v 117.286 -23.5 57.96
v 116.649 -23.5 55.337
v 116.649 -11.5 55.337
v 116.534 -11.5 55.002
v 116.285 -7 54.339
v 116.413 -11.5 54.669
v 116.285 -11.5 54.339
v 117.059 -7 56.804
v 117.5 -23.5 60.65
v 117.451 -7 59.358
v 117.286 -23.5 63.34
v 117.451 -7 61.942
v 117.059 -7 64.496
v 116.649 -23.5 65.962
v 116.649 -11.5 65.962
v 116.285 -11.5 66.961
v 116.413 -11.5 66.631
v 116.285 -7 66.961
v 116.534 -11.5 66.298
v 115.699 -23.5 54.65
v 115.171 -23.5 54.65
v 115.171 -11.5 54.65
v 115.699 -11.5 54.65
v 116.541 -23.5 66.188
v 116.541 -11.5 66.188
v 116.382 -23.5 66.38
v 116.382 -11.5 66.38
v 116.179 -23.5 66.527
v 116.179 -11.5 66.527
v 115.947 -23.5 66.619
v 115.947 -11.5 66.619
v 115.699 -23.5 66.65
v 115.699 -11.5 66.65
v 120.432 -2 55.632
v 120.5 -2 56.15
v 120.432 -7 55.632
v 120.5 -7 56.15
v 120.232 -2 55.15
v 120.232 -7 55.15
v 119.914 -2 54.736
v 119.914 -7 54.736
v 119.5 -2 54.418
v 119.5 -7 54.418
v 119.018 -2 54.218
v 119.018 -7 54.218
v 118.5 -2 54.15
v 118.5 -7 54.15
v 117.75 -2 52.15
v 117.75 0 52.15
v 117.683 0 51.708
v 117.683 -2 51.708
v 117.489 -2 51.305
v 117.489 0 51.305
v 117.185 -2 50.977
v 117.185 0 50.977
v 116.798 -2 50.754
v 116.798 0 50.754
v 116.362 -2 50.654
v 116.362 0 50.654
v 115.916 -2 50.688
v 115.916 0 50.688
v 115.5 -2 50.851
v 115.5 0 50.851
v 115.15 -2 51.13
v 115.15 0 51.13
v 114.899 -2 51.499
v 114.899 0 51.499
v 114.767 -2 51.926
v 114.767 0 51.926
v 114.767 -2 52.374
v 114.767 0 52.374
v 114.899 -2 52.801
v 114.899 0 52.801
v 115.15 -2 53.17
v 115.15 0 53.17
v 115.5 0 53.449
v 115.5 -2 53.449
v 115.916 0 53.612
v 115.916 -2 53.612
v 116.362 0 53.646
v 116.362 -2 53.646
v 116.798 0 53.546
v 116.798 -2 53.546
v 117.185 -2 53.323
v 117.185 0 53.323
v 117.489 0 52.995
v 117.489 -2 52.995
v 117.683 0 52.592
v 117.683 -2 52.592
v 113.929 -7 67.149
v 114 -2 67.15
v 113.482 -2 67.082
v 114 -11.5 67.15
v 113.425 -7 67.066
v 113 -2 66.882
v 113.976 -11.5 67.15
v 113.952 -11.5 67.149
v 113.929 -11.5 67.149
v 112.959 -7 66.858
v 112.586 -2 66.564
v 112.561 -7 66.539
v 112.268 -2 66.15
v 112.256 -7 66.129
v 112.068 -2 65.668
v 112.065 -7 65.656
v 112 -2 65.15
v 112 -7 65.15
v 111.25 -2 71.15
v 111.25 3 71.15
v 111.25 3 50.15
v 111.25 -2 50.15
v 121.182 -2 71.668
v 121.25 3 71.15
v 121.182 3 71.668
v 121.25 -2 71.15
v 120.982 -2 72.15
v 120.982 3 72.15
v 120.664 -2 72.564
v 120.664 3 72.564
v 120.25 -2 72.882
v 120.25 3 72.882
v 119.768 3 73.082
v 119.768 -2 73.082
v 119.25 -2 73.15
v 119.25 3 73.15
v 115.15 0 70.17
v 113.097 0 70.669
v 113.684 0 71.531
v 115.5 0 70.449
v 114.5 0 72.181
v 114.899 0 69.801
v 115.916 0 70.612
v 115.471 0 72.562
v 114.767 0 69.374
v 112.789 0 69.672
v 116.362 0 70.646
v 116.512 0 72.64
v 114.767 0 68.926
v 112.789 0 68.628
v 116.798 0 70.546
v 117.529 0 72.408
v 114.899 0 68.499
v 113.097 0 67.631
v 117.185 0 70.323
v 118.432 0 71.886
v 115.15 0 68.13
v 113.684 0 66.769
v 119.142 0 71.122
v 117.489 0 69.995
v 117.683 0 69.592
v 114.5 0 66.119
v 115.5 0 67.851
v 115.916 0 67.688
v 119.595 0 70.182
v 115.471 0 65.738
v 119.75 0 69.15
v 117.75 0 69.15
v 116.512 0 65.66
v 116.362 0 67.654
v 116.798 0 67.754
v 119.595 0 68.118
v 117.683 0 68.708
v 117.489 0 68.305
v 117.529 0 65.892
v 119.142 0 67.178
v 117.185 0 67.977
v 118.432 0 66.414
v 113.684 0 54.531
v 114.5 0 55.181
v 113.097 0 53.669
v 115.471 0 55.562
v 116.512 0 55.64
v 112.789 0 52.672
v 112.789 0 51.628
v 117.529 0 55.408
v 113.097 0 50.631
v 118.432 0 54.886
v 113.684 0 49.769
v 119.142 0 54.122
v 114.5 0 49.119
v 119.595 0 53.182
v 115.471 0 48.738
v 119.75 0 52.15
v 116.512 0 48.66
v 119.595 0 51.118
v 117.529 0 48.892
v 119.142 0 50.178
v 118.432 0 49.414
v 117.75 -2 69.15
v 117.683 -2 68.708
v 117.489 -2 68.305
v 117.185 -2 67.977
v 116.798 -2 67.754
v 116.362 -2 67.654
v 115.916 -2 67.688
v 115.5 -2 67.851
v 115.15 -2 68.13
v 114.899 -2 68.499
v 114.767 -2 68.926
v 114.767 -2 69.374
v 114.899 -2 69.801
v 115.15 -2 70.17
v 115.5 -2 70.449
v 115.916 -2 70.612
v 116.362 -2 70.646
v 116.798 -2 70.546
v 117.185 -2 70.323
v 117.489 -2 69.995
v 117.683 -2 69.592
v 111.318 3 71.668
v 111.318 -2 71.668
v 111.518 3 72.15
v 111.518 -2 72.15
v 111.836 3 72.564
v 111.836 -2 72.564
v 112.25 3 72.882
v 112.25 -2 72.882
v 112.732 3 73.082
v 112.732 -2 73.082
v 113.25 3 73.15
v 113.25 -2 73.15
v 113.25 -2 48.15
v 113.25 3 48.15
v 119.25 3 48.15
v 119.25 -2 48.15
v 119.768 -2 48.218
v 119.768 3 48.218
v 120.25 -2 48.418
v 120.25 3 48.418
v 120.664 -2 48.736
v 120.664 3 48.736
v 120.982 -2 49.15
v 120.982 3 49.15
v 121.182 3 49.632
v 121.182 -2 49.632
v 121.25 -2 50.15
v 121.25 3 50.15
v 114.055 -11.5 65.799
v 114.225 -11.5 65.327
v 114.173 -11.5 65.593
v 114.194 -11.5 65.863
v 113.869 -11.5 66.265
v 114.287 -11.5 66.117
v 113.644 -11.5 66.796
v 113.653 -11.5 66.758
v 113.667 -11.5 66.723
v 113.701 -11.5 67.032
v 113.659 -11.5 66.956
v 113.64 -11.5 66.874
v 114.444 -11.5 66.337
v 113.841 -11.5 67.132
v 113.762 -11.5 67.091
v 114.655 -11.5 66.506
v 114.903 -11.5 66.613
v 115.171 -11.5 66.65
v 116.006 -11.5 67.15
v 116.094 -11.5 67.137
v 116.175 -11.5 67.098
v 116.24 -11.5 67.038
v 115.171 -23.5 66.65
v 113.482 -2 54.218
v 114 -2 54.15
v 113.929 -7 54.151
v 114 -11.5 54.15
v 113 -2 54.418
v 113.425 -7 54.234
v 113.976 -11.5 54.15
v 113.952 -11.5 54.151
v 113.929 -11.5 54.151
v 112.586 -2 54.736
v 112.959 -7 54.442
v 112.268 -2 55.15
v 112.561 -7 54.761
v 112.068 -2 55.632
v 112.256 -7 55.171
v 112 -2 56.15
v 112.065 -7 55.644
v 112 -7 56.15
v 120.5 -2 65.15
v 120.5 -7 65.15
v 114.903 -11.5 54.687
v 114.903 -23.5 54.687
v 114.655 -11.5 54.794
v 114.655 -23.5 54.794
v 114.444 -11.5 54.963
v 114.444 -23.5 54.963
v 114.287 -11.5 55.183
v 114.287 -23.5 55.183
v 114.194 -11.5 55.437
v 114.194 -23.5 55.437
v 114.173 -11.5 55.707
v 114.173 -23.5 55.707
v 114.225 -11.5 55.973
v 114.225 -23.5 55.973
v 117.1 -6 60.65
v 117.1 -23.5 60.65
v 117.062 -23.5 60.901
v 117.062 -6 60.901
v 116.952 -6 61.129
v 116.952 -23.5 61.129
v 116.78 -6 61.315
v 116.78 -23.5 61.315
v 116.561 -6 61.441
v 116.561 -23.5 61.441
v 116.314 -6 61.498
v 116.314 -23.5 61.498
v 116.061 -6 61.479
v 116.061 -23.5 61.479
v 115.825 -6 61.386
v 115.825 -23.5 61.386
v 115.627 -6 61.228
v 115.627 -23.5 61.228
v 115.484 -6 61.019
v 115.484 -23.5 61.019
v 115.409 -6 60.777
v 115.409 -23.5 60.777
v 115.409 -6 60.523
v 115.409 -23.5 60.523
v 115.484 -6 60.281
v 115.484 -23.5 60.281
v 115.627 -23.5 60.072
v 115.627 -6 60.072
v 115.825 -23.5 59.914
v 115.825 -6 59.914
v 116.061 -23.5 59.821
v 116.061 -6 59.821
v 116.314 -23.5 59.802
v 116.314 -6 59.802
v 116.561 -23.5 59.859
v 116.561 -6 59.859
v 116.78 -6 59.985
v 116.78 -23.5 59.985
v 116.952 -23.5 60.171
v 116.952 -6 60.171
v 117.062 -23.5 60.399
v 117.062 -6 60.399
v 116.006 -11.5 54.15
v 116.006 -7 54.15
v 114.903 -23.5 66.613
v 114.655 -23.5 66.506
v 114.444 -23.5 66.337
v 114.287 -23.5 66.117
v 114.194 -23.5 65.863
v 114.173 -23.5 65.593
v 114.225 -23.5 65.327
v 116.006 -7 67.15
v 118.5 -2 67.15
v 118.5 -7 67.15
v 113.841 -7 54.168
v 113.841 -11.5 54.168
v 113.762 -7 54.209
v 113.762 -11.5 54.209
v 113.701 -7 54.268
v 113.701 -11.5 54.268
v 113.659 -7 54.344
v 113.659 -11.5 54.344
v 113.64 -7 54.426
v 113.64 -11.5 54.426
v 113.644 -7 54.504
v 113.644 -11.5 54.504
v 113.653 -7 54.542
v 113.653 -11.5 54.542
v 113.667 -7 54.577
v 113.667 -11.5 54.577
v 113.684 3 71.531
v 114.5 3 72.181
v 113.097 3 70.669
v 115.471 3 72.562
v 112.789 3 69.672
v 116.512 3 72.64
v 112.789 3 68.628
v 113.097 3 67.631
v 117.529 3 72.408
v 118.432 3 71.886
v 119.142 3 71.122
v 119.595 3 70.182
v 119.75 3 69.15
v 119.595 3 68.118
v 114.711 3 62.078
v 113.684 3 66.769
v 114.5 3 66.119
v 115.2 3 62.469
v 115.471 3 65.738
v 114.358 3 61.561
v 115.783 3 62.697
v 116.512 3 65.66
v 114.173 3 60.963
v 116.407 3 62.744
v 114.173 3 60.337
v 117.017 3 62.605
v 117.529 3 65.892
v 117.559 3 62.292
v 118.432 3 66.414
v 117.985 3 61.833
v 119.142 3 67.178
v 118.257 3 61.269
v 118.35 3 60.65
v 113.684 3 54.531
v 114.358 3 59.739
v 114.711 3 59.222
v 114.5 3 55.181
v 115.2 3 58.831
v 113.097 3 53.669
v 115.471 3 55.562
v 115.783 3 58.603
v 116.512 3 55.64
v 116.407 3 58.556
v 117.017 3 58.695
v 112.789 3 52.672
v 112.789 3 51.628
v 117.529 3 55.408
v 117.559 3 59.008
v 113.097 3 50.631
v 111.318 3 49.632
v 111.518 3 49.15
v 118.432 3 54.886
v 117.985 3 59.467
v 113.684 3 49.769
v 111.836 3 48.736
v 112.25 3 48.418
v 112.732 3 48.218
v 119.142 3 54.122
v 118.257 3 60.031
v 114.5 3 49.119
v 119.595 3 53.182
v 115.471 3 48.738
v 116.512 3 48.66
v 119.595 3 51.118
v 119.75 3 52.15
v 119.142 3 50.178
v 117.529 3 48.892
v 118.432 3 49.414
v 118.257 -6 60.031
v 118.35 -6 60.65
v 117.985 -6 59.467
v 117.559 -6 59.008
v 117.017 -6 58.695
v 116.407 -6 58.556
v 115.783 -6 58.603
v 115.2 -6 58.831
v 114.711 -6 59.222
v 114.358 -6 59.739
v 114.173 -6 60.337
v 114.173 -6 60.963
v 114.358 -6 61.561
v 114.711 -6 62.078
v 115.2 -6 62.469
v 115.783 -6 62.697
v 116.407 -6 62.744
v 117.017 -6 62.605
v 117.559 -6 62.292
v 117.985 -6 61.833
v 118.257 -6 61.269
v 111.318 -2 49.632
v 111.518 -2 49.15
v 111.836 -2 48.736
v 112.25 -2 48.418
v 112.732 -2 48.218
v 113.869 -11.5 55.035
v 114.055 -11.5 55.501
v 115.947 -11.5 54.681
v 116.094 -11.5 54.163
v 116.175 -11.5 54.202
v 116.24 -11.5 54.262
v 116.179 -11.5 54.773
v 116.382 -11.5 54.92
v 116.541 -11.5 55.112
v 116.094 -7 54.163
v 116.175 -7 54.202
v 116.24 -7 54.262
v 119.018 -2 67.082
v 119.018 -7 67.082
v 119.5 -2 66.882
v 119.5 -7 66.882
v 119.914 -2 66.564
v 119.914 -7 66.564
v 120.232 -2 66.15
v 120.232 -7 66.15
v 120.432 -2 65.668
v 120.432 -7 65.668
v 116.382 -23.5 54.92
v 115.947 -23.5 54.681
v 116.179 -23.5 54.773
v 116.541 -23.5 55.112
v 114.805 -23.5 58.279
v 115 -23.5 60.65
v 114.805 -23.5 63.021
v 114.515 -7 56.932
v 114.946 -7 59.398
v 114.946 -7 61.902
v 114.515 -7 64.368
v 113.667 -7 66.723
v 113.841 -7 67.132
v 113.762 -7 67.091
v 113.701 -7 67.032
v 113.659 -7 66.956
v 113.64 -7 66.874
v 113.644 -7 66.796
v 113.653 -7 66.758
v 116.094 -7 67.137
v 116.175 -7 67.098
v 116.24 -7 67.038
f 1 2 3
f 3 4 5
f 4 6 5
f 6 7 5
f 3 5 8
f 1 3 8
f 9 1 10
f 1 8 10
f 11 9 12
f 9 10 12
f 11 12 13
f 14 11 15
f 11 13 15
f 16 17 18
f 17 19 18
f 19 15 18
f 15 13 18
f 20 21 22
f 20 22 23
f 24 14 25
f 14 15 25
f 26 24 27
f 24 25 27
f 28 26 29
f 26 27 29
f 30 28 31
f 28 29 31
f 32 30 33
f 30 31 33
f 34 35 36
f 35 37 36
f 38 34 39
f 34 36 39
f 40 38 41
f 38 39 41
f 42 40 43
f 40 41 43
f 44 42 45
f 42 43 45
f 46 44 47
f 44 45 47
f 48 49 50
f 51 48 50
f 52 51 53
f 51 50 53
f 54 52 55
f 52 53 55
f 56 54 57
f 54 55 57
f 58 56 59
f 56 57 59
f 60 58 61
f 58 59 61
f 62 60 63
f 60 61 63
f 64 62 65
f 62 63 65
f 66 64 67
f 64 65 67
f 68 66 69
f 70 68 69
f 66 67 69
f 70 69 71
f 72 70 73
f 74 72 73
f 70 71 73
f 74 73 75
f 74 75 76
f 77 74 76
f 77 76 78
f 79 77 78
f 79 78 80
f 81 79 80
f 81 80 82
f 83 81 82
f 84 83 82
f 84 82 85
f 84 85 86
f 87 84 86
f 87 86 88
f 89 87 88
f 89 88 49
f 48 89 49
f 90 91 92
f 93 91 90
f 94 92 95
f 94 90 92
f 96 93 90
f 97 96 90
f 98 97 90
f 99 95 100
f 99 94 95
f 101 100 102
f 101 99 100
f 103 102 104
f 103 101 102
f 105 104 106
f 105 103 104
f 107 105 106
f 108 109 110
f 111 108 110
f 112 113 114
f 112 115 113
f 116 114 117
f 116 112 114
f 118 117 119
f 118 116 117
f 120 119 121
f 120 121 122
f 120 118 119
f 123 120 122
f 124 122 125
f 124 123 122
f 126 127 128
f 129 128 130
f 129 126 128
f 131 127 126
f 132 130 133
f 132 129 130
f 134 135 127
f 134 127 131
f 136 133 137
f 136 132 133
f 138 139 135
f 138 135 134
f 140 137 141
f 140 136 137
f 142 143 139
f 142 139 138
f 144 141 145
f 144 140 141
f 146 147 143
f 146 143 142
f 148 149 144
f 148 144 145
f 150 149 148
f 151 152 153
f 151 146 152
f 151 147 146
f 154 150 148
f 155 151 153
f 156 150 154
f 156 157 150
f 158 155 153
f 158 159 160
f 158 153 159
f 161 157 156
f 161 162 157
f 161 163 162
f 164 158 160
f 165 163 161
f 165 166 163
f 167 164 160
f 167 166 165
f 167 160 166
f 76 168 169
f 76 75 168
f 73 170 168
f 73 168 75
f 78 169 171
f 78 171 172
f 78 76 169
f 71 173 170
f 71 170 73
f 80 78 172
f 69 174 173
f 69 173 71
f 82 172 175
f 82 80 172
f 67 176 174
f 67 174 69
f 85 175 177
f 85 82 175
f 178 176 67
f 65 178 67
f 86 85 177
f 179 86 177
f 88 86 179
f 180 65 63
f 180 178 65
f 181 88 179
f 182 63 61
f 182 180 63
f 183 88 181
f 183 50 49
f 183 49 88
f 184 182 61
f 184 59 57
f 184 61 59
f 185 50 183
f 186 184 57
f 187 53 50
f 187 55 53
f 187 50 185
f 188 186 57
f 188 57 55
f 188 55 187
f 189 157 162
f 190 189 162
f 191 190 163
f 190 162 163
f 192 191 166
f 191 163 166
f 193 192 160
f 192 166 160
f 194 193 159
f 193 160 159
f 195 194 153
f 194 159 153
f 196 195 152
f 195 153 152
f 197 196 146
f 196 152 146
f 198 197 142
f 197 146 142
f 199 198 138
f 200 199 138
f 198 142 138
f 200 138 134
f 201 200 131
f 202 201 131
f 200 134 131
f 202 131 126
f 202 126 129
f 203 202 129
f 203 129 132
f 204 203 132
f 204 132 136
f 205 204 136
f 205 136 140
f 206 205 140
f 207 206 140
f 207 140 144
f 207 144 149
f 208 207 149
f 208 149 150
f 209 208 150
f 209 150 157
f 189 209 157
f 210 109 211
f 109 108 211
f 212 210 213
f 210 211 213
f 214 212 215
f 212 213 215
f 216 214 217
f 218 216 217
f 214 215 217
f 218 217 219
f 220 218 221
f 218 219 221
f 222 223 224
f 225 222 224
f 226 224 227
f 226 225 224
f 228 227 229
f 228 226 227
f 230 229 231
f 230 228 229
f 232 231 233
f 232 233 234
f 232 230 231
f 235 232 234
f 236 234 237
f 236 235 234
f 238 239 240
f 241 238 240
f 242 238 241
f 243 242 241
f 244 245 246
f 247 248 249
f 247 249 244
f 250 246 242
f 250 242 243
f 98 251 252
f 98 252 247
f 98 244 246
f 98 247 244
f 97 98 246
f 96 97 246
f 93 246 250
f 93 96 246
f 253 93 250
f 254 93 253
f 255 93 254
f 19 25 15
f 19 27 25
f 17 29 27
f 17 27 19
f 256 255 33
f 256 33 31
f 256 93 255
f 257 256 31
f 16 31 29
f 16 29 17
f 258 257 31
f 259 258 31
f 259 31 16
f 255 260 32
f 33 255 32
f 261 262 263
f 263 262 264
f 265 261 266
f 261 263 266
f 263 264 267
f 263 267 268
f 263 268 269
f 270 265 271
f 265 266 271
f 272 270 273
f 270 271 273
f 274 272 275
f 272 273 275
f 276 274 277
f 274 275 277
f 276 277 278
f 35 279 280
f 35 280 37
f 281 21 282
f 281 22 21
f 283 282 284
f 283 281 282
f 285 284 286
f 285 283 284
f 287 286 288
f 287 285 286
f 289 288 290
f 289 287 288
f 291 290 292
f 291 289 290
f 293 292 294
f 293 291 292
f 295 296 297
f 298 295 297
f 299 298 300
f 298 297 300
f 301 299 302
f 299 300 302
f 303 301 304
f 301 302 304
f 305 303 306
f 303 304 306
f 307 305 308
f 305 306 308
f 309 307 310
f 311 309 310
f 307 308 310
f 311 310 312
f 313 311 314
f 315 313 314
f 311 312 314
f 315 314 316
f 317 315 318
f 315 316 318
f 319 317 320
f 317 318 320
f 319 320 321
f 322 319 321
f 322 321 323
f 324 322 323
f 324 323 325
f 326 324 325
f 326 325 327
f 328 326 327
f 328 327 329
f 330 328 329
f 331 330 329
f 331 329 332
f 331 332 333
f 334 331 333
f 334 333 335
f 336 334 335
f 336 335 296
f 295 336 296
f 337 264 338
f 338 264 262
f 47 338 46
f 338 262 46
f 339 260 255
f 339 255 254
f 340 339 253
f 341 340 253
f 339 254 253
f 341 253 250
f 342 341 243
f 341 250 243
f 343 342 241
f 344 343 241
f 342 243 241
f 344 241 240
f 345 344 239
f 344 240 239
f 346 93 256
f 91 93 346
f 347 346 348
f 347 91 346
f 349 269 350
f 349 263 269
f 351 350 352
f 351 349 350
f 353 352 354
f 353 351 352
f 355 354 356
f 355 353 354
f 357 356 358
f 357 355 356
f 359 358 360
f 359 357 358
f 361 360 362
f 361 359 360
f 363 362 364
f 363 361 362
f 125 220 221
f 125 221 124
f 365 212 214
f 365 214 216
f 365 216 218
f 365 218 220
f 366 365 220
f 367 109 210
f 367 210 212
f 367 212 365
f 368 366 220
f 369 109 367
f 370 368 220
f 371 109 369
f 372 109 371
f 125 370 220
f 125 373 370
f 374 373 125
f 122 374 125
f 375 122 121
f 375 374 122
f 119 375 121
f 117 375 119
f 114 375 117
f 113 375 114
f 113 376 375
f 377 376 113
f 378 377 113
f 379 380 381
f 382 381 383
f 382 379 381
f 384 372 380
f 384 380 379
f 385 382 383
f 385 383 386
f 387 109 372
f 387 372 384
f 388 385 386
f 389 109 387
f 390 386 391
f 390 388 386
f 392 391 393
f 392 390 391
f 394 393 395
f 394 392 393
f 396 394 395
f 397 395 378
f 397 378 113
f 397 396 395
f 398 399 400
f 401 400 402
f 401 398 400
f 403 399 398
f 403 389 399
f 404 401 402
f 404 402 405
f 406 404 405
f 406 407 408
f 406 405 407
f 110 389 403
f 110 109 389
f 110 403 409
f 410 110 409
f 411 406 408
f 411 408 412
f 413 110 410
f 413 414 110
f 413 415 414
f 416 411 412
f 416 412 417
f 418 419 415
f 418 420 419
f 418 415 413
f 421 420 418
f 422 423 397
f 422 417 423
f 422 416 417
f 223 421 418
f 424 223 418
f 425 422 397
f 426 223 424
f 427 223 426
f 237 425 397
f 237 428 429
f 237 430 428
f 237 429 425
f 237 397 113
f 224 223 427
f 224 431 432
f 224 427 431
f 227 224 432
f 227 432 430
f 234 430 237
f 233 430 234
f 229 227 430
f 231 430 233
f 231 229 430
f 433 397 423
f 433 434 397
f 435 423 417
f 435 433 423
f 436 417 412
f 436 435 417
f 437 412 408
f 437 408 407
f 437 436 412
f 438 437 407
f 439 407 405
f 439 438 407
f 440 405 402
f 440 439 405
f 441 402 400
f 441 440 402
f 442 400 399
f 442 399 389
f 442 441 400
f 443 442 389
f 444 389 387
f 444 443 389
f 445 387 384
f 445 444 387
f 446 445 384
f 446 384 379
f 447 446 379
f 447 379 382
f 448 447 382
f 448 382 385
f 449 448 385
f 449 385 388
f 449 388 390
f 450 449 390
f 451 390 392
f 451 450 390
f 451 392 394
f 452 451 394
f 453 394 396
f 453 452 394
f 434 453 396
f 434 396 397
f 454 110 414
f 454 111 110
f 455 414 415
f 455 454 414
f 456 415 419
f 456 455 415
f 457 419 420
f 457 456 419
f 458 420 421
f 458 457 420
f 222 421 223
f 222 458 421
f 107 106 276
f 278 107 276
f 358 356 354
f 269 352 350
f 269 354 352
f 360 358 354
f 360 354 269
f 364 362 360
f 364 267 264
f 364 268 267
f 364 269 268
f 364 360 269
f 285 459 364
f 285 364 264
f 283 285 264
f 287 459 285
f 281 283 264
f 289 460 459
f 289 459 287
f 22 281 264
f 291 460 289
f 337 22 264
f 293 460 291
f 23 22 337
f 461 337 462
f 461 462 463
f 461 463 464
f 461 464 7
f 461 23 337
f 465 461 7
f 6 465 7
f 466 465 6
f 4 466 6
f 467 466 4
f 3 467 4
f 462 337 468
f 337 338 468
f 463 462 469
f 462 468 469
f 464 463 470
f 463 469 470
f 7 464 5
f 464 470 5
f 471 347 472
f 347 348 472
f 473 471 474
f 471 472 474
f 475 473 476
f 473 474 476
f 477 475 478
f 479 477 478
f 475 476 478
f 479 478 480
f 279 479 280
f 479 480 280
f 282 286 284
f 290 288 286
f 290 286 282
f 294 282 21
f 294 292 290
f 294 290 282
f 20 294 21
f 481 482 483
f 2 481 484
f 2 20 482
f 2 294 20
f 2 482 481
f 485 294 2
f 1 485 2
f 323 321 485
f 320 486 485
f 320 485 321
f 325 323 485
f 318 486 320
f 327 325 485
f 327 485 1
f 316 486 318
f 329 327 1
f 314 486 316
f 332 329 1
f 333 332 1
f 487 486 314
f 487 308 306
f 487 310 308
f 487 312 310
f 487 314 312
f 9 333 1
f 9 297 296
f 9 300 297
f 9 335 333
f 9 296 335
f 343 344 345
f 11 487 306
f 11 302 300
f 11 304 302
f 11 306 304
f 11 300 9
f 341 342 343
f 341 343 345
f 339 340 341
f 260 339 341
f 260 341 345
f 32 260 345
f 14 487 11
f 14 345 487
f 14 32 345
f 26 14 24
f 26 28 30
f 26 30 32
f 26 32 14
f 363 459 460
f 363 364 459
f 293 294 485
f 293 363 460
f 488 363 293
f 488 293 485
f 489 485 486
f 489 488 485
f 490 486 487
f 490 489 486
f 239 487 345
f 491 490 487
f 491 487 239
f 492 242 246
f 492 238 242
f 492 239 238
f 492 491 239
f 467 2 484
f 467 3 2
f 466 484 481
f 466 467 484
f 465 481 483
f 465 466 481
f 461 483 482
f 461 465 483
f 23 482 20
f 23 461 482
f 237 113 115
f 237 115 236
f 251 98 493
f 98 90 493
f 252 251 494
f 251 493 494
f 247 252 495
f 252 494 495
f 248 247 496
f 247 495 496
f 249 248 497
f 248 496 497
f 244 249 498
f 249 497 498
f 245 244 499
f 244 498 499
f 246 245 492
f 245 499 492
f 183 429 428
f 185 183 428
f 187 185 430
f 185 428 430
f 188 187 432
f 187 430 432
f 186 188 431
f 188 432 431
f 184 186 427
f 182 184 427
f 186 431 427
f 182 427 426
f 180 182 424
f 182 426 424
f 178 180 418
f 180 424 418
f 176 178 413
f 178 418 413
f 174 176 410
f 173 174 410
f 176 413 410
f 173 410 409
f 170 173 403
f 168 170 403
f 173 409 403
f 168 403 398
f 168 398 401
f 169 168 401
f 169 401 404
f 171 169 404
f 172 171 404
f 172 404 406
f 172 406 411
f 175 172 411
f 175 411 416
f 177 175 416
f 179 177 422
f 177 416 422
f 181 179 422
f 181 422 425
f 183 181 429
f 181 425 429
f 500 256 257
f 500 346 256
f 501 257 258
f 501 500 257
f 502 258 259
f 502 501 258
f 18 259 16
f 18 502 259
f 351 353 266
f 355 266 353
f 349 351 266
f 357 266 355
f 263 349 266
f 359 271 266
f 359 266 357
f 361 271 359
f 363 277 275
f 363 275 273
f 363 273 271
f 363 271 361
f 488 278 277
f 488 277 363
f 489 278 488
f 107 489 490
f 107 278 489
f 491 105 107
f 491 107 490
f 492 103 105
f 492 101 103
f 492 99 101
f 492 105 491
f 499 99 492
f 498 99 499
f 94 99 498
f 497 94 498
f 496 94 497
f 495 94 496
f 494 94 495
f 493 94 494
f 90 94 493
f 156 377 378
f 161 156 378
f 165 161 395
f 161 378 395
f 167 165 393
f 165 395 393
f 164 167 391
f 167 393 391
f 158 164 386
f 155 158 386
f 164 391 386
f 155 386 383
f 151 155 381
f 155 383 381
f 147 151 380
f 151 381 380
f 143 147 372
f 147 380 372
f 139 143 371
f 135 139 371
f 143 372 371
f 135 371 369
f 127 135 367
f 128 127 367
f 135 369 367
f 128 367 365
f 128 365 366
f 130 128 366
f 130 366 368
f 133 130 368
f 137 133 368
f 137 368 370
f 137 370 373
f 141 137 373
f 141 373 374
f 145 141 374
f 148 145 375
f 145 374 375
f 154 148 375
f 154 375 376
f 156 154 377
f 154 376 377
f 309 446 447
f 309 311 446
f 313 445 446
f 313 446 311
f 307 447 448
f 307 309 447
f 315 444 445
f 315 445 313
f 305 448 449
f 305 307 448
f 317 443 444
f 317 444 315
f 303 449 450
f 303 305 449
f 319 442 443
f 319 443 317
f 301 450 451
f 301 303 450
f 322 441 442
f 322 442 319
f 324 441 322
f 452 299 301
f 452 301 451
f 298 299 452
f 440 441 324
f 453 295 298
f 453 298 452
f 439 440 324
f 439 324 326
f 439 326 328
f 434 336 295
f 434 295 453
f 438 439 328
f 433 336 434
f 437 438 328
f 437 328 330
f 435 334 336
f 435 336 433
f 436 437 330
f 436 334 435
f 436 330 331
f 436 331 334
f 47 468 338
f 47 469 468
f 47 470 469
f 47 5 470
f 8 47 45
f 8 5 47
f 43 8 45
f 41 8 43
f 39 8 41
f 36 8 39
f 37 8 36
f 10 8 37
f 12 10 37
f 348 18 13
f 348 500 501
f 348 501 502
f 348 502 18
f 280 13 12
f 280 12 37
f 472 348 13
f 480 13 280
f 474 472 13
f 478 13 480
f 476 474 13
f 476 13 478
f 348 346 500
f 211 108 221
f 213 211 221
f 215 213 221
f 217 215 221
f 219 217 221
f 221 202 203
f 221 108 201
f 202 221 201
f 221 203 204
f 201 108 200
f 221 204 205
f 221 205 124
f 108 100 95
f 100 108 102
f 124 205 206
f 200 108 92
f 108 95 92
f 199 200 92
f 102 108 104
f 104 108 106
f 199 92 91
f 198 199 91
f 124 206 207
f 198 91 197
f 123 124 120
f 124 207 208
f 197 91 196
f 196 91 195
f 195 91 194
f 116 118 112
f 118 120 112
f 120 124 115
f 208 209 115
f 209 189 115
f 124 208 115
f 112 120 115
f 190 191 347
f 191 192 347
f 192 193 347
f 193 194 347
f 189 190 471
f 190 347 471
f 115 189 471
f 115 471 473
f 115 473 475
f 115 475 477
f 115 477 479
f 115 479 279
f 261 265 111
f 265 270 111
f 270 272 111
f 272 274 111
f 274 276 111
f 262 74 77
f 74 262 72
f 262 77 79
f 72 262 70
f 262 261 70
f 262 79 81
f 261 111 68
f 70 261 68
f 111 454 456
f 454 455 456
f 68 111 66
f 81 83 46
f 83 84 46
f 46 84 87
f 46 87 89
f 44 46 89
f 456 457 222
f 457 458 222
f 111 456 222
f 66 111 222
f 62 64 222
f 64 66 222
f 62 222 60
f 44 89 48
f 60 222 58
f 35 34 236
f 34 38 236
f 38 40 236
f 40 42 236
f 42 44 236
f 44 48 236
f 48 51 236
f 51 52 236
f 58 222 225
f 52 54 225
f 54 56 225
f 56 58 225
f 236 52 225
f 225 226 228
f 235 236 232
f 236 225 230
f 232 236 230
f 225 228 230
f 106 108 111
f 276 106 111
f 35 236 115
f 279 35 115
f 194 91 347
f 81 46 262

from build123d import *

# Parameters (mm, degrees)
SKETCH1_W           = 123.5
SKETCH1_H           = 81.5
BOSS_EXTRUDE1_DEPTH = 8
CHAMFER1_SIZE       = 10
SKETCH2_W           = 130
SKETCH2_H           = 88
BOSS_EXTRUDE2_DEPTH = 9
FILLET1_R           = 2
SKETCH3_W           = 124
SKETCH3_H           = 82
CUT_EXTRUDE1_DEPTH  = 2
FILLET2_R           = 2
SKETCH4_R           = 10
CUT_EXTRUDE2_DEPTH  = 18
SKETCH5_R           = 17
SKETCH5_R_2         = 14.5
BOSS_EXTRUDE3_DEPTH = 16.5
SKETCH6_W           = 170
SKETCH6_H           = 36.5
SKETCH6_W_2         = 114
SKETCH6_H_2         = 12
CUT_EXTRUDE3_DEPTH  = 12
FILLET3_R           = 1
SKETCH7_R           = 0.85
CUT_EXTRUDE4_DEPTH  = 20.75
SKETCH11_W          = 130
SKETCH11_H          = 10
CUT_EXTRUDE8_DEPTH  = 85.75
SKETCH13_R          = 2.1
CUT_EXTRUDE9_DEPTH  = 6
SKETCH15_R          = 2.1
SKETCH15_R_2        = 10
BOSS_EXTRUDE4_DEPTH = 3
SKETCH16_W          = 188.077165187
SKETCH16_H          = 117.101438596
SKETCH16_W_2        = 10
SKETCH16_H_2        = 25
CUT_EXTRUDE10_DEPTH = 27.5
CUT_EXTRUDE11_START = -5
SKETCH17_W          = 10
SKETCH17_H          = 25
SKETCH17_W_2        = 8.5
SKETCH17_H_2        = 13
CUT_EXTRUDE11_DEPTH = 22.5
FILLET4_R           = 2
SKETCH18_R          = 1.5
CUT_EXTRUDE12_DEPTH = 27.5
SKETCH19_R          = 3.5
CUT_EXTRUDE13_DEPTH = 3
FILLET5_R           = 0.3


with BuildPart() as part:
    # Sketch1 → Boss-Extrude1 (new body)
    with BuildSketch(Plane(origin=(0, 0, 0), x_dir=(1, 0, 0), z_dir=(0, 1, 0))):
        with Locations((61.75, -40.75)):
            Rectangle(SKETCH1_W, SKETCH1_H)
    extrude(amount=BOSS_EXTRUDE1_DEPTH)

    # Chamfer1
    chamfer1_edges = [part.edges().sort_by_distance(p)[0] for p in [
        (123.5, 4, 0),
        (123.5, 4, 81.5),
    ]]
    chamfer(chamfer1_edges, length=CHAMFER1_SIZE)

    # Sketch2 → Boss-Extrude2 (add)
    with BuildSketch(Plane.XZ):
        with Locations((61.75, 40.75)):
            Rectangle(SKETCH2_W, SKETCH2_H)
    extrude(amount=BOSS_EXTRUDE2_DEPTH)

    # Fillet1
    fillet1_edges = [part.edges().sort_by_distance(p)[0] for p in [
        (113.5, 4, 0),
        (123.5, 4, 71.5),
        (123.5, 4, 10),
        (113.5, 4, 81.5),
        (-3.25, -4.5, 84.75),
        (-3.25, -4.5, -3.25),
        (126.75, -4.5, -3.25),
        (126.75, -4.5, 84.75),
        (0, 4, 0),
        (0, 4, 81.5),
    ]]
    fillet(fillet1_edges, radius=FILLET1_R)

    # Sketch3 → Cut-Extrude1 (cut)
    with BuildSketch(Plane.XZ.offset(9)):
        with Locations((61.75, 40.75)):
            Rectangle(SKETCH3_W, SKETCH3_H)
    extrude(amount=-CUT_EXTRUDE1_DEPTH, mode=Mode.SUBTRACT)

    # Fillet2
    fillet2_edges = [part.edges().sort_by_distance(p)[0] for p in [
        (-0.25, -8, -0.25),
        (-0.25, -8, 81.75),
        (123.75, -8, 81.75),
        (123.75, -8, -0.25),
    ]]
    fillet(fillet2_edges, radius=FILLET2_R)

    # Sketch4 → Cut-Extrude2 (cut, through all)
    with BuildSketch(Plane(origin=(0, 8, 0), x_dir=(1, 0, 0), z_dir=(0, 1, 0))):
        with Locations((22.5, -20.85)):
            Circle(SKETCH4_R)
        with Locations((61.5, -20.85)):
            Circle(SKETCH4_R)
        with Locations((100.5, -20.85)):
            Circle(SKETCH4_R)
        with Locations((100.5, -60.65)):
            Circle(SKETCH4_R)
        with Locations((61.5, -60.65)):
            Circle(SKETCH4_R)
        with Locations((22.5, -60.65)):
            Circle(SKETCH4_R)
    extrude(amount=-CUT_EXTRUDE2_DEPTH, mode=Mode.SUBTRACT)

    # Sketch5 → Boss-Extrude3 (add)
    with BuildSketch(Plane.XZ.offset(7)):
        with Locations((22.5, 60.65)):
            Circle(SKETCH5_R)
        with Locations((22.5, 60.65)):
            Circle(SKETCH5_R_2, mode=Mode.SUBTRACT)
        with Locations((61.5, 60.65)):
            Circle(SKETCH5_R)
        with Locations((61.5, 60.65)):
            Circle(SKETCH5_R_2, mode=Mode.SUBTRACT)
        with Locations((100.5, 60.65)):
            Circle(SKETCH5_R)
        with Locations((100.5, 60.65)):
            Circle(SKETCH5_R_2, mode=Mode.SUBTRACT)
        with Locations((100.5, 20.85)):
            Circle(SKETCH5_R)
        with Locations((100.5, 20.85)):
            Circle(SKETCH5_R_2, mode=Mode.SUBTRACT)
        with Locations((61.5, 20.85)):
            Circle(SKETCH5_R)
        with Locations((61.5, 20.85)):
            Circle(SKETCH5_R_2, mode=Mode.SUBTRACT)
        with Locations((22.5, 20.85)):
            Circle(SKETCH5_R)
        with Locations((22.5, 20.85)):
            Circle(SKETCH5_R_2, mode=Mode.SUBTRACT)
    extrude(amount=BOSS_EXTRUDE3_DEPTH)

    # Sketch6 → Cut-Extrude3 (cut)
    with BuildSketch(Plane.XZ.offset(23.5)):
        with Locations((61.5, 20.85)):
            Rectangle(SKETCH6_W, SKETCH6_H)
        with Locations((61.5, 20.85)):
            Rectangle(SKETCH6_W_2, SKETCH6_H_2, mode=Mode.SUBTRACT)
        with Locations((61.5, 60.65)):
            Rectangle(SKETCH6_W, SKETCH6_H)
        with Locations((61.5, 60.65)):
            Rectangle(SKETCH6_W_2, SKETCH6_H_2, mode=Mode.SUBTRACT)
    extrude(amount=-CUT_EXTRUDE3_DEPTH, mode=Mode.SUBTRACT)

    # Fillet3
    fillet3_edges = [part.edges().sort_by_distance(p)[0] for p in [
        (87.299621218, -17.5, 66.65),
        (113.700378782, -17.5, 66.65),
        (113.700378782, -17.5, 54.65),
        (87.299621218, -17.5, 54.65),
        (9.299621218, -17.5, 54.65),
        (35.700378782, -17.5, 54.65),
        (6.594026279, -17.5, 54.65),
        (48.299621218, -17.5, 54.65),
        (74.700378782, -17.5, 54.65),
        (38.405973721, -17.5, 54.65),
        (45.594026279, -17.5, 54.65),
        (77.405973721, -17.5, 54.65),
        (84.594026279, -17.5, 54.65),
        (35.700378782, -17.5, 66.65),
        (9.299621218, -17.5, 66.65),
        (38.405973721, -17.5, 66.65),
        (45.594026279, -17.5, 66.65),
        (74.700378782, -17.5, 66.65),
        (48.299621218, -17.5, 66.65),
        (77.405973721, -17.5, 66.65),
        (84.594026279, -17.5, 66.65),
        (116.405973721, -17.5, 66.65),
        (116.405973721, -17.5, 54.65),
        (6.594026279, -17.5, 66.65),
        (35.700378782, -17.5, 14.85),
        (9.299621218, -17.5, 14.85),
        (9.299621218, -17.5, 26.85),
        (35.700378782, -17.5, 26.85),
        (113.700378782, -17.5, 26.85),
        (87.299621218, -17.5, 26.85),
        (116.405973721, -17.5, 26.85),
        (74.700378782, -17.5, 26.85),
        (48.299621218, -17.5, 26.85),
        (84.594026279, -17.5, 26.85),
        (77.405973721, -17.5, 26.85),
        (45.594026279, -17.5, 26.85),
        (38.405973721, -17.5, 26.85),
        (87.299621218, -17.5, 14.85),
        (113.700378782, -17.5, 14.85),
        (84.594026279, -17.5, 14.85),
        (77.405973721, -17.5, 14.85),
        (48.299621218, -17.5, 14.85),
        (74.700378782, -17.5, 14.85),
        (45.594026279, -17.5, 14.85),
        (38.405973721, -17.5, 14.85),
        (6.594026279, -17.5, 14.85),
        (6.594026279, -17.5, 26.85),
        (116.405973721, -17.5, 14.85),
    ]]
    fillet(fillet3_edges, radius=FILLET3_R)

    # Sketch7 → Cut-Extrude4 (cut)
    with BuildSketch(Plane.XZ.offset(23.5)):
        with Locations((6.75, 20.85)):
            Circle(SKETCH7_R)
        with Locations((38.25, 20.85)):
            Circle(SKETCH7_R)
        with Locations((45.75, 20.85)):
            Circle(SKETCH7_R)
        with Locations((77.25, 20.85)):
            Circle(SKETCH7_R)
        with Locations((84.75, 20.85)):
            Circle(SKETCH7_R)
        with Locations((116.25, 20.85)):
            Circle(SKETCH7_R)
        with Locations((116.25, 60.65)):
            Circle(SKETCH7_R)
        with Locations((84.75, 60.65)):
            Circle(SKETCH7_R)
        with Locations((77.25, 60.65)):
            Circle(SKETCH7_R)
        with Locations((45.75, 60.65)):
            Circle(SKETCH7_R)
        with Locations((38.25, 60.65)):
            Circle(SKETCH7_R)
        with Locations((6.75, 60.65)):
            Circle(SKETCH7_R)
    extrude(amount=-CUT_EXTRUDE4_DEPTH, mode=Mode.SUBTRACT)

    # Sketch11 → Cut-Extrude8 (cut, through all)
    with BuildSketch(Plane(origin=(0, 0, 0), x_dir=(-1, 0, 0), z_dir=(0, 0, -1))):
        with Locations((-61.75, 5)):
            Rectangle(SKETCH11_W, SKETCH11_H)
    extrude(amount=-CUT_EXTRUDE8_DEPTH, mode=Mode.SUBTRACT)

    # Sketch13 → Cut-Extrude9 (cut)
    with BuildSketch(Plane(origin=(0, 0, 0), x_dir=(1, 0, 0), z_dir=(0, 1, 0))):
        with Locations((116.25, -60.65)):
            Circle(SKETCH13_R)
        with Locations((85.5, -60.65)):
            Circle(SKETCH13_R)
        with Locations((76.5, -60.65)):
            Circle(SKETCH13_R)
        with Locations((116.25, -20.85)):
            Circle(SKETCH13_R)
        with Locations((85.5, -20.85)):
            Circle(SKETCH13_R)
        with Locations((76.5, -20.85)):
            Circle(SKETCH13_R)
        with Locations((46.5, -20.85)):
            Circle(SKETCH13_R)
        with Locations((37.5, -20.85)):
            Circle(SKETCH13_R)
        with Locations((6.75, -20.85)):
            Circle(SKETCH13_R)
        with Locations((6.75, -60.65)):
            Circle(SKETCH13_R)
        with Locations((37.5, -60.65)):
            Circle(SKETCH13_R)
        with Locations((46.5, -60.65)):
            Circle(SKETCH13_R)
    extrude(amount=-CUT_EXTRUDE9_DEPTH, mode=Mode.SUBTRACT)

    # Sketch15 → Boss-Extrude4 (add)
    with BuildSketch(Plane(origin=(0, 0, 0), x_dir=(1, 0, 0), z_dir=(0, 1, 0))):
        with BuildLine():
            Line((126.75, -82.75), (126.75, 1.25))
            ThreePointArc((126.75, 1.25), (126.164213562, 2.664213562), (124.75, 3.25))
            Line((124.75, 3.25), (-1.25, 3.25))
            ThreePointArc((-1.25, 3.25), (-2.664213562, 2.664213562), (-3.25, 1.25))
            Line((-3.25, 1.25), (-3.25, -82.75))
            ThreePointArc((-3.25, -82.75), (-2.664213562, -84.164213562), (-1.25, -84.75))
            Line((-1.25, -84.75), (124.75, -84.75))
            ThreePointArc((124.75, -84.75), (126.164213562, -84.164213562), (126.75, -82.75))
        make_face()
        with Locations((6.75, -60.65)):
            Circle(SKETCH15_R, mode=Mode.SUBTRACT)
        with Locations((22.5, -60.65)):
            Circle(SKETCH15_R_2, mode=Mode.SUBTRACT)
        with Locations((37.5, -60.65)):
            Circle(SKETCH15_R, mode=Mode.SUBTRACT)
        with Locations((46.5, -60.65)):
            Circle(SKETCH15_R, mode=Mode.SUBTRACT)
        with Locations((61.5, -60.65)):
            Circle(SKETCH15_R_2, mode=Mode.SUBTRACT)
        with Locations((76.5, -60.65)):
            Circle(SKETCH15_R, mode=Mode.SUBTRACT)
        with Locations((100.5, -60.65)):
            Circle(SKETCH15_R_2, mode=Mode.SUBTRACT)
        with Locations((116.25, -60.65)):
            Circle(SKETCH15_R, mode=Mode.SUBTRACT)
        with Locations((116.25, -20.85)):
            Circle(SKETCH15_R, mode=Mode.SUBTRACT)
        with Locations((100.5, -20.85)):
            Circle(SKETCH15_R_2, mode=Mode.SUBTRACT)
        with Locations((85.5, -20.85)):
            Circle(SKETCH15_R, mode=Mode.SUBTRACT)
        with Locations((76.5, -20.85)):
            Circle(SKETCH15_R, mode=Mode.SUBTRACT)
        with Locations((61.5, -20.85)):
            Circle(SKETCH15_R_2, mode=Mode.SUBTRACT)
        with Locations((46.5, -20.85)):
            Circle(SKETCH15_R, mode=Mode.SUBTRACT)
        with Locations((37.5, -20.85)):
            Circle(SKETCH15_R, mode=Mode.SUBTRACT)
        with Locations((22.5, -20.85)):
            Circle(SKETCH15_R_2, mode=Mode.SUBTRACT)
        with Locations((85.5, -60.65)):
            Circle(SKETCH15_R, mode=Mode.SUBTRACT)
        with Locations((6.75, -20.85)):
            Circle(SKETCH15_R, mode=Mode.SUBTRACT)
    extrude(amount=BOSS_EXTRUDE4_DEPTH)

    # Sketch16 → Cut-Extrude10 (cut, through all)
    with BuildSketch(Plane(origin=(0, 3, 0), x_dir=(1, 0, 0), z_dir=(0, 1, 0))):
        with Locations((70.835120056, -43.47328927)):
            Rectangle(SKETCH16_W, SKETCH16_H)
        with Locations((116.25, -60.65)):
            Rectangle(SKETCH16_W_2, SKETCH16_H_2, mode=Mode.SUBTRACT)
    extrude(amount=-CUT_EXTRUDE10_DEPTH, mode=Mode.SUBTRACT)

    # Sketch17 → Cut-Extrude11 (cut, through all)
    with BuildSketch(Plane(origin=(0, 3, 0), x_dir=(1, 0, 0), z_dir=(0, 1, 0)).offset(CUT_EXTRUDE11_START)):
        with Locations((116.25, -60.65)):
            Rectangle(SKETCH17_W, SKETCH17_H)
        with Locations((116.25, -60.65)):
            Rectangle(SKETCH17_W_2, SKETCH17_H_2, mode=Mode.SUBTRACT)
    extrude(amount=-CUT_EXTRUDE11_DEPTH, mode=Mode.SUBTRACT)

    # Fillet4
    fillet4_edges = [part.edges().sort_by_distance(p)[0] for p in [
        (120.5, -4.5, 54.15),
        (121.25, 0.5, 48.15),
        (120.5, -4.5, 67.15),
        (112, -4.5, 54.15),
        (112, -4.5, 67.15),
        (121.25, 0.5, 73.15),
        (111.25, 0.5, 73.15),
        (111.25, 0.5, 48.15),
    ]]
    fillet(fillet4_edges, radius=FILLET4_R)

    # Sketch18 → Cut-Extrude12 (cut, through all)
    with BuildSketch(Plane(origin=(0, 3, 0), x_dir=(1, 0, 0), z_dir=(0, 1, 0))):
        with Locations((116.25, -52.15)):
            Circle(SKETCH18_R)
        with Locations((116.25, -69.15)):
            Circle(SKETCH18_R)
    extrude(amount=-CUT_EXTRUDE12_DEPTH, mode=Mode.SUBTRACT)

    # Sketch19 → Cut-Extrude13 (cut)
    with BuildSketch(Plane(origin=(0, 3, 0), x_dir=(1, 0, 0), z_dir=(0, 1, 0))):
        with Locations((116.25, -52.15)):
            Circle(SKETCH19_R)
        with Locations((116.25, -69.15)):
            Circle(SKETCH19_R)
    extrude(amount=-CUT_EXTRUDE13_DEPTH, mode=Mode.SUBTRACT)

    # Fillet5
    fillet5_edges = [part.edges().sort_by_distance(p)[0] for p in [
        (116.208278072, -9.25, 67.15),
        (116.208278072, -9.25, 54.15),
        (113.493918477, -9.25, 67.084911236),
        (113.493918477, -9.25, 54.215088764),
    ]]
    fillet(fillet5_edges, radius=FILLET5_R)


solid = part.part
